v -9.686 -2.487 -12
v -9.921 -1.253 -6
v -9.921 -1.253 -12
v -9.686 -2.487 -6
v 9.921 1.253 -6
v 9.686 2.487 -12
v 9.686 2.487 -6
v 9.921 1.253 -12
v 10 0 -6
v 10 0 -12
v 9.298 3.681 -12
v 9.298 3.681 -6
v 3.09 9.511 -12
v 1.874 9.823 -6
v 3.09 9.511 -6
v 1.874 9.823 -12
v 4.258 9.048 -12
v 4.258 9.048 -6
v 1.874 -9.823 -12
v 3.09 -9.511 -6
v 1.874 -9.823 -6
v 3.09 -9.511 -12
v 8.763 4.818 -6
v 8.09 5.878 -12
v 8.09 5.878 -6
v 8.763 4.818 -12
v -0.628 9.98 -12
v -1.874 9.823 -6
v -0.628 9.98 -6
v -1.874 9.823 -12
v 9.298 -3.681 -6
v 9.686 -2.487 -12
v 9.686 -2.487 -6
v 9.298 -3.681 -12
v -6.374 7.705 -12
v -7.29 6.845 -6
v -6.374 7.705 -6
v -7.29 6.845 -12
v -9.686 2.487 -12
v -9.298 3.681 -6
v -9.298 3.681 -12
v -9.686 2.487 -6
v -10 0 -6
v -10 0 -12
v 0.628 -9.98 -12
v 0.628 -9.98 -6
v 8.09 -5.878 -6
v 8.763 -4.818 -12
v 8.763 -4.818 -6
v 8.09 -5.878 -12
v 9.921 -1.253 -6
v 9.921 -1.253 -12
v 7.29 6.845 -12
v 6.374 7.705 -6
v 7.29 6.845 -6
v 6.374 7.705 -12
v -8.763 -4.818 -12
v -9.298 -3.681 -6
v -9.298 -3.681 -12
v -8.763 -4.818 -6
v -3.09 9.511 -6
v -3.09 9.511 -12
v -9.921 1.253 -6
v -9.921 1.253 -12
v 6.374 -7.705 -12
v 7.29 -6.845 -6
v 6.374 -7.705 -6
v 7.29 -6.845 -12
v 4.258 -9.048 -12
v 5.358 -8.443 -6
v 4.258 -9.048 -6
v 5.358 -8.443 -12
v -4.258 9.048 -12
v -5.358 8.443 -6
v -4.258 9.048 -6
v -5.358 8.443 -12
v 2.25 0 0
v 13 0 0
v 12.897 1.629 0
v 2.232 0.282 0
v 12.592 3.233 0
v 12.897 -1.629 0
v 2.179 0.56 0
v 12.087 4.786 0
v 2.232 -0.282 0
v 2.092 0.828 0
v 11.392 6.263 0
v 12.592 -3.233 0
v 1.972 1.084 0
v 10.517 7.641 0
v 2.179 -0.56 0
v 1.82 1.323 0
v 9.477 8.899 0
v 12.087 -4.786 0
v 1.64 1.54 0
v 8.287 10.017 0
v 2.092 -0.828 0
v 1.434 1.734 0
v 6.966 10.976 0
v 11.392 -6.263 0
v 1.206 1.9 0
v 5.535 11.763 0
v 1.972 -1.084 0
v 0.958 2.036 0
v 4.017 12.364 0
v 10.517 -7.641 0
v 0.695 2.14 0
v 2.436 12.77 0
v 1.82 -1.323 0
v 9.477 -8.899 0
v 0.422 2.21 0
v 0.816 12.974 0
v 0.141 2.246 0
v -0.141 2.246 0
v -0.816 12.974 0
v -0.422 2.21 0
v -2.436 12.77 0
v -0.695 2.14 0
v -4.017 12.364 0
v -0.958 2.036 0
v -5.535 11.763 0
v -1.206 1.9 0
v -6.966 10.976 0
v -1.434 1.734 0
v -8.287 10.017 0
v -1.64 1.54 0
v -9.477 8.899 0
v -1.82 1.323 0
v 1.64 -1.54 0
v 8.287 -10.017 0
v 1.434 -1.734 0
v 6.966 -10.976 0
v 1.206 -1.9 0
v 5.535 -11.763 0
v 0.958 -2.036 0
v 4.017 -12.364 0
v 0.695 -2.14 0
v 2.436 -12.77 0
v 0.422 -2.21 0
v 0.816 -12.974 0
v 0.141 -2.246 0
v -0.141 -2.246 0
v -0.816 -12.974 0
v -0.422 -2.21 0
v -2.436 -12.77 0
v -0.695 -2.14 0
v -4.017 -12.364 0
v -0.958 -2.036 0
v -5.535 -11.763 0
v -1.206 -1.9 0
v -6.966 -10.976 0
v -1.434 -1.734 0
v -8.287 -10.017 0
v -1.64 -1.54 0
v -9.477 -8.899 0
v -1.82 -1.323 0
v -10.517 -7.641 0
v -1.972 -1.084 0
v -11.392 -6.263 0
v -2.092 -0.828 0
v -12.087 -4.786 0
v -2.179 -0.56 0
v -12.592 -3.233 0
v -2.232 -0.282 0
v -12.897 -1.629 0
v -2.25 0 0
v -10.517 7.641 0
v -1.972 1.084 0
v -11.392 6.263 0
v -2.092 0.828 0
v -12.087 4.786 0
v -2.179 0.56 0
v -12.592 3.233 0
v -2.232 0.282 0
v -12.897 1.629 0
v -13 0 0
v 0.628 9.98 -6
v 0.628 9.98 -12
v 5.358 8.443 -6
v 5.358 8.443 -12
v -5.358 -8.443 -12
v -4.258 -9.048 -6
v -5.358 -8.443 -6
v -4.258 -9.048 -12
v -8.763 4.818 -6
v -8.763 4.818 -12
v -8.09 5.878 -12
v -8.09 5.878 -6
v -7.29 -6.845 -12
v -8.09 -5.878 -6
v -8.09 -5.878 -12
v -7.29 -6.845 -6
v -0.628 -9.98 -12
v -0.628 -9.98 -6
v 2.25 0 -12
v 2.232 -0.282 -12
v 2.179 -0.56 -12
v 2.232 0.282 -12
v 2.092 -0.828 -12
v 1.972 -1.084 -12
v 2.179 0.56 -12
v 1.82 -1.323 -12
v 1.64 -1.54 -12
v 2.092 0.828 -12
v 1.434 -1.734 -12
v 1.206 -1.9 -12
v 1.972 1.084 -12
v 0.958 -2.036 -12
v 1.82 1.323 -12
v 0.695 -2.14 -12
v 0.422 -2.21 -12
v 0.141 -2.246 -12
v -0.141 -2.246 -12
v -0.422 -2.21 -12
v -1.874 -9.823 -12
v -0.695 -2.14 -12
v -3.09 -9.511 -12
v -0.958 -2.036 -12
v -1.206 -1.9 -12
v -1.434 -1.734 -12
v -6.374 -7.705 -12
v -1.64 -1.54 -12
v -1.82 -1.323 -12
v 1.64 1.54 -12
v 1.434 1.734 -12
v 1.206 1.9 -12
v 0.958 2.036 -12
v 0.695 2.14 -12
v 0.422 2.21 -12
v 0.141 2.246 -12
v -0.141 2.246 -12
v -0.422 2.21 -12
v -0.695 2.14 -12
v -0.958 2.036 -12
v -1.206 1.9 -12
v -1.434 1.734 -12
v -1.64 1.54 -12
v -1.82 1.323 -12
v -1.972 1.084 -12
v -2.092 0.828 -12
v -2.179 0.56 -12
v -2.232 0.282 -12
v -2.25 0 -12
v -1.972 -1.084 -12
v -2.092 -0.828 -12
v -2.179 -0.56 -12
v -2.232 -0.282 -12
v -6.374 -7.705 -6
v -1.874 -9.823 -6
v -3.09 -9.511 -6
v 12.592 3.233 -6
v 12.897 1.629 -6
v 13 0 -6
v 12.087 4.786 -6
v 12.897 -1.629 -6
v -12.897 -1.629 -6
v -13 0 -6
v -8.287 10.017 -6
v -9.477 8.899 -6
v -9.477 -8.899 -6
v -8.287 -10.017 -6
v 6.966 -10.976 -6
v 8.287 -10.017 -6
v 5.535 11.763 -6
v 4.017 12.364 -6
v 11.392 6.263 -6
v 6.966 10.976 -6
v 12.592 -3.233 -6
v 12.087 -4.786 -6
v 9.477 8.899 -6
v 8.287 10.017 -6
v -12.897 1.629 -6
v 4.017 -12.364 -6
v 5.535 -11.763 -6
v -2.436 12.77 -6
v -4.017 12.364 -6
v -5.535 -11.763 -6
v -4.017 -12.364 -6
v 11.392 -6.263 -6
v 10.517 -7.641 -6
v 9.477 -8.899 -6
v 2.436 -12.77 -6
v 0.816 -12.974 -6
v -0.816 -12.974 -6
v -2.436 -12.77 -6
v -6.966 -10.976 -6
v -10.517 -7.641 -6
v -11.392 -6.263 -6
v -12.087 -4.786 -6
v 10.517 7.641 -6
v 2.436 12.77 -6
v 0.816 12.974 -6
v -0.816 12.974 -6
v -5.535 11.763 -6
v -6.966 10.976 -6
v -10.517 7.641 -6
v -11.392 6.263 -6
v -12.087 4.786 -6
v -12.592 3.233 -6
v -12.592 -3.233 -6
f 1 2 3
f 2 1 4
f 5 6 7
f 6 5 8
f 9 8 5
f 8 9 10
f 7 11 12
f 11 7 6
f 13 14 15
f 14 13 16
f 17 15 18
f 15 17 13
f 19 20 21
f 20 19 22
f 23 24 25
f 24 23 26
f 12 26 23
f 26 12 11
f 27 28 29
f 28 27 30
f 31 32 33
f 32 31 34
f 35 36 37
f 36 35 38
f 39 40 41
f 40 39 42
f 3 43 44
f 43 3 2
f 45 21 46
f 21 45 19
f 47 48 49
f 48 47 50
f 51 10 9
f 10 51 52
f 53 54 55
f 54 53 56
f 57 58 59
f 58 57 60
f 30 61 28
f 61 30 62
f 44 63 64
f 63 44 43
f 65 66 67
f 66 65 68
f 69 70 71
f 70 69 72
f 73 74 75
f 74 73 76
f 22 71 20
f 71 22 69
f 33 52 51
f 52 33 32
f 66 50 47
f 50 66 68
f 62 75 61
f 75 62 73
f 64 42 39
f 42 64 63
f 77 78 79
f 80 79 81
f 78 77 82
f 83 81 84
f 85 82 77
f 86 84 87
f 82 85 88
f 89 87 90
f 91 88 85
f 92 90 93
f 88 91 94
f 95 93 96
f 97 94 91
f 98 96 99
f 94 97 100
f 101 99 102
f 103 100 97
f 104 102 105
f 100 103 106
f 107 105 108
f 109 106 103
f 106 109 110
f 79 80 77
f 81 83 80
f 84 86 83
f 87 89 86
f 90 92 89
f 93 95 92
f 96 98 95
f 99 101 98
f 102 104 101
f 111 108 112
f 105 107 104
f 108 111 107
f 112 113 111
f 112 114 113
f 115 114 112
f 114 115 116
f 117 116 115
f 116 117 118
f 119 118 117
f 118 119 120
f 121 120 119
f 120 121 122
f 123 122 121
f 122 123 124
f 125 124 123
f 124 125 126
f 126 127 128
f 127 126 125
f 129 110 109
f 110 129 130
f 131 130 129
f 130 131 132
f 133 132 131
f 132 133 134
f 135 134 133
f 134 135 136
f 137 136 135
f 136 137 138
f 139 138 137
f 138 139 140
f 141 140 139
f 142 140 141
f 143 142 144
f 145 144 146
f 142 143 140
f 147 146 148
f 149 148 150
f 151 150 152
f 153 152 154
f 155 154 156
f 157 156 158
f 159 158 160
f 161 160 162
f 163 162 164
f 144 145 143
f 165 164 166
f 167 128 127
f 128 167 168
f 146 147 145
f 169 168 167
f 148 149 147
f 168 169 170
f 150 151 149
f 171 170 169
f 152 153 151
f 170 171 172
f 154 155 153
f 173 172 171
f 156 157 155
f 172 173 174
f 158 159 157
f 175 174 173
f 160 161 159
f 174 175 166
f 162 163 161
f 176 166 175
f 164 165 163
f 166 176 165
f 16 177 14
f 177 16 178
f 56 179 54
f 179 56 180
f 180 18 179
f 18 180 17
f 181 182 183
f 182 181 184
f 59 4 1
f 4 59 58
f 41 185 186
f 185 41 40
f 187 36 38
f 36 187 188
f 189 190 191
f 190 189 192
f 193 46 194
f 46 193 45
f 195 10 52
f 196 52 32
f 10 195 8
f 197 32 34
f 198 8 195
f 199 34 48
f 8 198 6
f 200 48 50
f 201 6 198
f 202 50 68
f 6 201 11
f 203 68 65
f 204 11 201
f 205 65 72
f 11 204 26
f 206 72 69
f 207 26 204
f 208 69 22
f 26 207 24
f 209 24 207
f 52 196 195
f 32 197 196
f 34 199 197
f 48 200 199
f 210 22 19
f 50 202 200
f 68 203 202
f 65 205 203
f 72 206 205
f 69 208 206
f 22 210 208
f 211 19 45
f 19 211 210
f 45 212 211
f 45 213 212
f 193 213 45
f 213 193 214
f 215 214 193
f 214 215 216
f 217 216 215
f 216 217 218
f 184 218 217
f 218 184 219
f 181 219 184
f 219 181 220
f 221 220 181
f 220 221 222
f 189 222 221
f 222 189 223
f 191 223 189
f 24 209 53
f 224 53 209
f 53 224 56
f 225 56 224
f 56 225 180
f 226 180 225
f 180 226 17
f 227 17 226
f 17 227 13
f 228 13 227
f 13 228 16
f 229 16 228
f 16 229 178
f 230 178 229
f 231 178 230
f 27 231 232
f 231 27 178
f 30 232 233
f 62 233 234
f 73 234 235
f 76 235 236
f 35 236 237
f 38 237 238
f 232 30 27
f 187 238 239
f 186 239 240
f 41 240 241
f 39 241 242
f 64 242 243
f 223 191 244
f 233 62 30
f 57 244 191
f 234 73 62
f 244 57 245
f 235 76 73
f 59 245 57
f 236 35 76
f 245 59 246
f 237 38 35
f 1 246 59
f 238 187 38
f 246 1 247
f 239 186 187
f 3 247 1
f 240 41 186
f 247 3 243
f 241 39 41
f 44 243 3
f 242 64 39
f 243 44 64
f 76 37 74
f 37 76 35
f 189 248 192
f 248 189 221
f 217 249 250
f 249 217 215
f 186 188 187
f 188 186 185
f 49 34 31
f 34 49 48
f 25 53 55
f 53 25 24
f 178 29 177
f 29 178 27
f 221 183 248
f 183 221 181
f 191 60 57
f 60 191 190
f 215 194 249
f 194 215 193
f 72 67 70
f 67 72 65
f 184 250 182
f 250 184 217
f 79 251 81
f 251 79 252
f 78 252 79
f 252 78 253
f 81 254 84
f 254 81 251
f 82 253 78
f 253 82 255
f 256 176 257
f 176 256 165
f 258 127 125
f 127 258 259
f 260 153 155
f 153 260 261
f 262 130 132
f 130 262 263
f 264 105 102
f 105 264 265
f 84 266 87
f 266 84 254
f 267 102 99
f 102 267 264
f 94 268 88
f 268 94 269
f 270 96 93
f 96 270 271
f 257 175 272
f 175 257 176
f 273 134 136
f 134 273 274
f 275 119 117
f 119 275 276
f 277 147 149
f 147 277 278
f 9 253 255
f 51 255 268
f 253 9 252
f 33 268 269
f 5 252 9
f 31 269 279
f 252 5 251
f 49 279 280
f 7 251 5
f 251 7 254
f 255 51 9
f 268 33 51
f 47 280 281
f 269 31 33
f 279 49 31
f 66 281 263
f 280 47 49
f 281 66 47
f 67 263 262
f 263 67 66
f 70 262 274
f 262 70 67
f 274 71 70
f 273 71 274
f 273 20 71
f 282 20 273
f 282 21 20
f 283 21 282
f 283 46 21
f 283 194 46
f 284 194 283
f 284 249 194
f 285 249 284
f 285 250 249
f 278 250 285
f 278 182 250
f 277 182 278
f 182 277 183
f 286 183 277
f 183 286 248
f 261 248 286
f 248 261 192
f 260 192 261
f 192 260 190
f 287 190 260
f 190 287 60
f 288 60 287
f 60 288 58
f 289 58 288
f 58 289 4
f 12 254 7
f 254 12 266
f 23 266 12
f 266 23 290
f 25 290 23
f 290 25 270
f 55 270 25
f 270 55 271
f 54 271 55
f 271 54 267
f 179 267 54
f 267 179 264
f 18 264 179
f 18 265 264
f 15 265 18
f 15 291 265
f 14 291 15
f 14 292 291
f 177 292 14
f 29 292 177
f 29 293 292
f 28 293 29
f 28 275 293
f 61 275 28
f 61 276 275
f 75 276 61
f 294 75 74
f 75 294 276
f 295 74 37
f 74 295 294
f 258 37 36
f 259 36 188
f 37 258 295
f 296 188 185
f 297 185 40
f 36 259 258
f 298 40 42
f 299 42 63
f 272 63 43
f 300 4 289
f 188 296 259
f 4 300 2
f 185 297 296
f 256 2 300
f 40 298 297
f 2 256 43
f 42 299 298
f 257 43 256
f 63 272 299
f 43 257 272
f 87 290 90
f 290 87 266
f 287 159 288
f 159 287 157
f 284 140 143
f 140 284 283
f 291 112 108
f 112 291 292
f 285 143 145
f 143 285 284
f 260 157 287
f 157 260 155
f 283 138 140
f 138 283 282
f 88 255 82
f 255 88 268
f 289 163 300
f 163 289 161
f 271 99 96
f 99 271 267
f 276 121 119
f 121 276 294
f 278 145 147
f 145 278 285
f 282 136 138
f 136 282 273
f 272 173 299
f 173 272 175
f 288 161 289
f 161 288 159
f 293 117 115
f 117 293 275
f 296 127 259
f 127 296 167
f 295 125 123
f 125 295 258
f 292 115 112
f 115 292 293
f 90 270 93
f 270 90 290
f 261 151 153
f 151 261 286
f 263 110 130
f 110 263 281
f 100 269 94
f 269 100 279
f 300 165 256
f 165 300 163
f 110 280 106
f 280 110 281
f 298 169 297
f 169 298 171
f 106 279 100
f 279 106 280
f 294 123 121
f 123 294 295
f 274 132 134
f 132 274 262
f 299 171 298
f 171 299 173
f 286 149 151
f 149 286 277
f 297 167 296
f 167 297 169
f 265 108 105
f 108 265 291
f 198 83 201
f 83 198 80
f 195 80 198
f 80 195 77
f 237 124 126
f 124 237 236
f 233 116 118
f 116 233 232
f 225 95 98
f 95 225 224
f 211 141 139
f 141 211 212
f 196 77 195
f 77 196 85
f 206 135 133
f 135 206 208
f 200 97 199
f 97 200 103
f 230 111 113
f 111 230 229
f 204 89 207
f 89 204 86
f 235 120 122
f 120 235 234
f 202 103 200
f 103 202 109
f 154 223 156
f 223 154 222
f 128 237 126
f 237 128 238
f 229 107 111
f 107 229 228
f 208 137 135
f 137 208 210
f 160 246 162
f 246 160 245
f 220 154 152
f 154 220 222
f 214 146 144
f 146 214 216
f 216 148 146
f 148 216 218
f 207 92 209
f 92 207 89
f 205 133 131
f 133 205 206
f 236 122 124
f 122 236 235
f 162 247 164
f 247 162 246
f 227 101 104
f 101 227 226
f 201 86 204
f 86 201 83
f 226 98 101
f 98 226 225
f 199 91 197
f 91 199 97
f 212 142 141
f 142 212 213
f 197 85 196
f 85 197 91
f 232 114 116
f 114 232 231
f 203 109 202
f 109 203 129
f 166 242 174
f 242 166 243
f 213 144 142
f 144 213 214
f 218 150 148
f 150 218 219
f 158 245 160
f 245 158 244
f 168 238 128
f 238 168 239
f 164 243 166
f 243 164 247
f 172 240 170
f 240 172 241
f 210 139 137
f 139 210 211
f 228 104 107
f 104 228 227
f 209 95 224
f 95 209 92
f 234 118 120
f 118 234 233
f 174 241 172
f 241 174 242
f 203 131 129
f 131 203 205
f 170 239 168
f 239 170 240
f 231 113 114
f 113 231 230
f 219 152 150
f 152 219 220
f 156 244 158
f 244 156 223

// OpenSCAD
$fn = 50;


difference() {
	union() {
		translate(v = [0, 0, -12.0000000000]) {
			cylinder(h = 12, r = 10.0000000000);
		}
		translate(v = [0, 0, -6.0000000000]) {
			cylinder(h = 6, r = 13.0000000000);
		}
	}
	union() {
		#translate(v = [0, 0, -12]) {
			cylinder(h = 12, r = 2.2500000000);
		}
	}
}
